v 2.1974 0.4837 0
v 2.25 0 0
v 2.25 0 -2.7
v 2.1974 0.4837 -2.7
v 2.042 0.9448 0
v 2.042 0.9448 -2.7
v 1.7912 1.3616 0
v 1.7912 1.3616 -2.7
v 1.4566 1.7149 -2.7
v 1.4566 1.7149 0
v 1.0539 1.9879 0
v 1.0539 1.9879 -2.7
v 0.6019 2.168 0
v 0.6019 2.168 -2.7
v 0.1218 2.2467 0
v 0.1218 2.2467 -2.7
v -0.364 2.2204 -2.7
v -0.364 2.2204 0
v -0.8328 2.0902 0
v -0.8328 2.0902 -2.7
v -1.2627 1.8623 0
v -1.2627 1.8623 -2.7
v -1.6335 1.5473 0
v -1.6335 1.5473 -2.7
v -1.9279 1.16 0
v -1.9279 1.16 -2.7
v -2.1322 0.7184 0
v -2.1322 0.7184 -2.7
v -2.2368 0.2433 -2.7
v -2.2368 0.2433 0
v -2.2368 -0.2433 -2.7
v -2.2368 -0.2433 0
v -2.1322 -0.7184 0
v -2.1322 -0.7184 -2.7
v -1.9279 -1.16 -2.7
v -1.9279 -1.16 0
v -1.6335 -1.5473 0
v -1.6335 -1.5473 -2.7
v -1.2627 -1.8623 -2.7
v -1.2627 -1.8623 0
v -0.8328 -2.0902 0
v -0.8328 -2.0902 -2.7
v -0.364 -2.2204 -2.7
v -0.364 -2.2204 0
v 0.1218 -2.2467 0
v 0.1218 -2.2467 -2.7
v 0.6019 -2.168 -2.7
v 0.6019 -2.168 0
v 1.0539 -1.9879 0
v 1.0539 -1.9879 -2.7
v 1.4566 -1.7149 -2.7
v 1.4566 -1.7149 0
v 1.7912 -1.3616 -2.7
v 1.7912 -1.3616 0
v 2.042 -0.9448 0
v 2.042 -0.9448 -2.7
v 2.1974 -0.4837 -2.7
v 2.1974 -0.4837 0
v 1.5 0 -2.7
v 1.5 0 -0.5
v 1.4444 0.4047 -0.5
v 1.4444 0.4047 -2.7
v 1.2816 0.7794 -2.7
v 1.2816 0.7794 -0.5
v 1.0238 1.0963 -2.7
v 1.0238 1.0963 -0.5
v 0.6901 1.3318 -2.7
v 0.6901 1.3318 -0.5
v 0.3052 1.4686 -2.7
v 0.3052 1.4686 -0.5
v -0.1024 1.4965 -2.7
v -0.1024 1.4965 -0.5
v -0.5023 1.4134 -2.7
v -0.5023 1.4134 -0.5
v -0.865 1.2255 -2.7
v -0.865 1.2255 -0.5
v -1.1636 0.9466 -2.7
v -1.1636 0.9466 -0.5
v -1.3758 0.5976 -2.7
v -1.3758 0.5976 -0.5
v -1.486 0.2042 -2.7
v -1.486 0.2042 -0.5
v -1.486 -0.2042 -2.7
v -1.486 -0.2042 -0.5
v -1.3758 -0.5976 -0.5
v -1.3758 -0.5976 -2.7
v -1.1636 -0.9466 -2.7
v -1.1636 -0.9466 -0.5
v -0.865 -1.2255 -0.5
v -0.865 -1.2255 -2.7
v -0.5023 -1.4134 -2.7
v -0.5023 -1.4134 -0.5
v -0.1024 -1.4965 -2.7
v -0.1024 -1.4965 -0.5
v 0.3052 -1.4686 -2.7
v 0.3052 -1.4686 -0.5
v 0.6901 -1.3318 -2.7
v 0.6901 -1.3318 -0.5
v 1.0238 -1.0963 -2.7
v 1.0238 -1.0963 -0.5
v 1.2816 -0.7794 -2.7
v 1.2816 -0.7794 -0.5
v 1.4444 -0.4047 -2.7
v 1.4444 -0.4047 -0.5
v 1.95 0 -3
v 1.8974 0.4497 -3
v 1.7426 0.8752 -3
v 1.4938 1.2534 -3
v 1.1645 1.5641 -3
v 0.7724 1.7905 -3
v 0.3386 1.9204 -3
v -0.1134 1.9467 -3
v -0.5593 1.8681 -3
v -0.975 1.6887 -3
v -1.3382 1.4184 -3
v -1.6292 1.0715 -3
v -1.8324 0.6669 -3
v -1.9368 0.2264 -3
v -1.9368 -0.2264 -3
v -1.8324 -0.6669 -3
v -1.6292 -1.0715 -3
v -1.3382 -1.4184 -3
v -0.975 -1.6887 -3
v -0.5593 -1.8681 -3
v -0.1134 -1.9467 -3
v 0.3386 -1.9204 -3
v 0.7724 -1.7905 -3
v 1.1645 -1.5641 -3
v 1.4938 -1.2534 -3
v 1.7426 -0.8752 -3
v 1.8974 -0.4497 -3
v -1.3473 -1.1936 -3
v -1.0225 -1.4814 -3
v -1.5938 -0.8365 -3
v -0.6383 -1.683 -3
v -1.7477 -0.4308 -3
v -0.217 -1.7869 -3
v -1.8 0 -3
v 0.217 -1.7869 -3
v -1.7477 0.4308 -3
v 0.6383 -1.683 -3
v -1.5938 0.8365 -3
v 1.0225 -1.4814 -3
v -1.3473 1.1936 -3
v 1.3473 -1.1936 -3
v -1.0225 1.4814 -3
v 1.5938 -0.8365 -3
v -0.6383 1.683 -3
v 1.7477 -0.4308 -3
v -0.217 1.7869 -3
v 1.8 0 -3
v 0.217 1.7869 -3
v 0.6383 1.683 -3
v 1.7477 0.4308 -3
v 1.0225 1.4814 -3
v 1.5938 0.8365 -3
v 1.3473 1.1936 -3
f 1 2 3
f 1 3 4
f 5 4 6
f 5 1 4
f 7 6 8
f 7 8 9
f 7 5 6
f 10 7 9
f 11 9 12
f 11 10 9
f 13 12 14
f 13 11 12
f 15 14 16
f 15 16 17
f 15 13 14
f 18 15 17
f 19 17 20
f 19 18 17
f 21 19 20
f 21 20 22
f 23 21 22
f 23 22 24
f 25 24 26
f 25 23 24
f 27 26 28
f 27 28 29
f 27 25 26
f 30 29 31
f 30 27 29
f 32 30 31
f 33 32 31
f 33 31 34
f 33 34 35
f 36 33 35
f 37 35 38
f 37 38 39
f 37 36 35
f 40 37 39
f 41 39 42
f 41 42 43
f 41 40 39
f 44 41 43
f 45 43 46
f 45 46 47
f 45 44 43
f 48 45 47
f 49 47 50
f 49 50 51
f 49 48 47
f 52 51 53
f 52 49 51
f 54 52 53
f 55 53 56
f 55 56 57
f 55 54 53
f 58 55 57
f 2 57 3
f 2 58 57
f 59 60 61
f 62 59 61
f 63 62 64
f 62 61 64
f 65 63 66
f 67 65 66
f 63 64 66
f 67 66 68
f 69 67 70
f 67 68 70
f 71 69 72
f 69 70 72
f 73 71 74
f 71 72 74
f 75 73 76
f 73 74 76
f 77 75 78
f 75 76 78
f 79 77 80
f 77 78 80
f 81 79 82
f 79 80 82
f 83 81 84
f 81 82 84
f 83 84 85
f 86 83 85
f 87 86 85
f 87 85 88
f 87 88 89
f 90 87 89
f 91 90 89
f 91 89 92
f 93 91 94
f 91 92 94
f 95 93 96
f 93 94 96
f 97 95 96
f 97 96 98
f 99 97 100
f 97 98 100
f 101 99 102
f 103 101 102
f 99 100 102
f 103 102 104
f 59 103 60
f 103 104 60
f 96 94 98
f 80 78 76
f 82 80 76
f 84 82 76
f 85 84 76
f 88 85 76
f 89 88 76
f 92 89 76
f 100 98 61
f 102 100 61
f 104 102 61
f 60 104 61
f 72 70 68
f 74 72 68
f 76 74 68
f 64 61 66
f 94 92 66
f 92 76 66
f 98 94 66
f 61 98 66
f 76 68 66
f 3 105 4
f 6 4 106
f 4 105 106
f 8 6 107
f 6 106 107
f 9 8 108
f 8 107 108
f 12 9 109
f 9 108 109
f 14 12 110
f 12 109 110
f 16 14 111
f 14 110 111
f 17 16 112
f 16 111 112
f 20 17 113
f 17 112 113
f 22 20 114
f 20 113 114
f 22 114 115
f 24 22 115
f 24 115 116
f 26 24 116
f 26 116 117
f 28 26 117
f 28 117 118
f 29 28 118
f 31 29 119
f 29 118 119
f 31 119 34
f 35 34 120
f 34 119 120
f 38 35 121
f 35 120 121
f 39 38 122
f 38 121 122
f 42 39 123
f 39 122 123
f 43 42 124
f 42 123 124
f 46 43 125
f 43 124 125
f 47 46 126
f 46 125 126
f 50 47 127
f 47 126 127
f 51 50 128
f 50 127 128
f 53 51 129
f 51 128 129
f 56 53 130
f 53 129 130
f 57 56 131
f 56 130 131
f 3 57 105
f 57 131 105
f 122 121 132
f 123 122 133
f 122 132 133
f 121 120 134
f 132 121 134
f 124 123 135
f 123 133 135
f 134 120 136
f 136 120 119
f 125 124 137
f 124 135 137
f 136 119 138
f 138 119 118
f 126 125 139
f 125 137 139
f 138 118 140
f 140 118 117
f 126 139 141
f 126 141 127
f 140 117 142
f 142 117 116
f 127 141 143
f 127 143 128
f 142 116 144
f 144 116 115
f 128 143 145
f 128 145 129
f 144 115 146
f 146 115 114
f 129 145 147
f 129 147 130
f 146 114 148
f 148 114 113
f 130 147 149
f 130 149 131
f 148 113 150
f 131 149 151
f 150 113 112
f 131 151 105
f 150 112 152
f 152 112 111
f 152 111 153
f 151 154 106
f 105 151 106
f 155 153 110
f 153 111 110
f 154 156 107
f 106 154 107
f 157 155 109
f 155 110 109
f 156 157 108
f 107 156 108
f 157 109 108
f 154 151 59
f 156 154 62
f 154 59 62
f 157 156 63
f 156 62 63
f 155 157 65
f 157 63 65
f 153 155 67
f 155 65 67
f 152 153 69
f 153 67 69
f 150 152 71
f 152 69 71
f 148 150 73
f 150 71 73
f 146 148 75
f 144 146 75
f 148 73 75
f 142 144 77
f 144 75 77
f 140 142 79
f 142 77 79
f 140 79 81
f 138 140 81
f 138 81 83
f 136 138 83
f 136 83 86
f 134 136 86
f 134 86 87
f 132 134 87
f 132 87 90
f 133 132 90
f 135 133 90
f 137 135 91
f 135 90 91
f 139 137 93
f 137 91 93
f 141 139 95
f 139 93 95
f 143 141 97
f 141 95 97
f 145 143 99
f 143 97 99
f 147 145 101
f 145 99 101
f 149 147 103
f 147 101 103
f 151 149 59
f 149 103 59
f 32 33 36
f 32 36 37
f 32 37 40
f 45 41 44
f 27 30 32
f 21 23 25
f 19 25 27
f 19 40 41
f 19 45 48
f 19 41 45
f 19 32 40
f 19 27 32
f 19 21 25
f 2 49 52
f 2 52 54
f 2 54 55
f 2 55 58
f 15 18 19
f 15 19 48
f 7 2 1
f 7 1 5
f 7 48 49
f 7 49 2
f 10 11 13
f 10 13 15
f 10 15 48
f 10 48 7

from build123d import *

# Parameters (mm, degrees)
F0_R     = 2.25
F0_R_2   = 1.5
F1_DEPTH = 3
F2_START = -0.5
F2_DEPTH = 2.5
F3_SIZE  = 0.3


with BuildPart() as f1:
    # F0 (on Top) → F1 (new body)
    with BuildSketch(Plane.XY):
        Circle(F0_R)
        Circle(F0_R_2, mode=Mode.SUBTRACT)
        Circle(F0_R_2)
    extrude(amount=-F1_DEPTH)

    # F0 (on Top) → F2 (cut)
    with BuildSketch(Plane.XY.offset(F2_START)):
        Circle(F0_R_2)
    extrude(amount=-F2_DEPTH, mode=Mode.SUBTRACT)

    # F3
    f3_edges = [f1.edges().sort_by_distance(p)[0] for p in [
        (-2.25, 0, -3),
        (-1.5, 0, -3),
    ]]
    chamfer(f3_edges, length=F3_SIZE)


solid = f1.part
